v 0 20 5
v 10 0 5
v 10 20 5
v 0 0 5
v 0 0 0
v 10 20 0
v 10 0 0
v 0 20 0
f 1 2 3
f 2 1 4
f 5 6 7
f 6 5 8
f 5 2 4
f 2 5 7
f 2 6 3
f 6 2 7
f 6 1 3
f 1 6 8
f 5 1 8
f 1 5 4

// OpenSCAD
module OpenscadModifiers(){
  union(){
    translate([-5, -10, 0])color("purple")cube([10, 20, 5.0]);
    translate([5, -10, 0])color("purple")#cube([10, 20, 5.0]);
    translate([15, -10, 0])%cube([10, 20, 5.0]);
    translate([25, -10, 0])color("purple")*cube([10, 20, 5.0]);
    translate([35, -10, 0])color("purple")!cube([10, 20, 5.0]);
  }
}
$fn=64;
OpenscadModifiers();
